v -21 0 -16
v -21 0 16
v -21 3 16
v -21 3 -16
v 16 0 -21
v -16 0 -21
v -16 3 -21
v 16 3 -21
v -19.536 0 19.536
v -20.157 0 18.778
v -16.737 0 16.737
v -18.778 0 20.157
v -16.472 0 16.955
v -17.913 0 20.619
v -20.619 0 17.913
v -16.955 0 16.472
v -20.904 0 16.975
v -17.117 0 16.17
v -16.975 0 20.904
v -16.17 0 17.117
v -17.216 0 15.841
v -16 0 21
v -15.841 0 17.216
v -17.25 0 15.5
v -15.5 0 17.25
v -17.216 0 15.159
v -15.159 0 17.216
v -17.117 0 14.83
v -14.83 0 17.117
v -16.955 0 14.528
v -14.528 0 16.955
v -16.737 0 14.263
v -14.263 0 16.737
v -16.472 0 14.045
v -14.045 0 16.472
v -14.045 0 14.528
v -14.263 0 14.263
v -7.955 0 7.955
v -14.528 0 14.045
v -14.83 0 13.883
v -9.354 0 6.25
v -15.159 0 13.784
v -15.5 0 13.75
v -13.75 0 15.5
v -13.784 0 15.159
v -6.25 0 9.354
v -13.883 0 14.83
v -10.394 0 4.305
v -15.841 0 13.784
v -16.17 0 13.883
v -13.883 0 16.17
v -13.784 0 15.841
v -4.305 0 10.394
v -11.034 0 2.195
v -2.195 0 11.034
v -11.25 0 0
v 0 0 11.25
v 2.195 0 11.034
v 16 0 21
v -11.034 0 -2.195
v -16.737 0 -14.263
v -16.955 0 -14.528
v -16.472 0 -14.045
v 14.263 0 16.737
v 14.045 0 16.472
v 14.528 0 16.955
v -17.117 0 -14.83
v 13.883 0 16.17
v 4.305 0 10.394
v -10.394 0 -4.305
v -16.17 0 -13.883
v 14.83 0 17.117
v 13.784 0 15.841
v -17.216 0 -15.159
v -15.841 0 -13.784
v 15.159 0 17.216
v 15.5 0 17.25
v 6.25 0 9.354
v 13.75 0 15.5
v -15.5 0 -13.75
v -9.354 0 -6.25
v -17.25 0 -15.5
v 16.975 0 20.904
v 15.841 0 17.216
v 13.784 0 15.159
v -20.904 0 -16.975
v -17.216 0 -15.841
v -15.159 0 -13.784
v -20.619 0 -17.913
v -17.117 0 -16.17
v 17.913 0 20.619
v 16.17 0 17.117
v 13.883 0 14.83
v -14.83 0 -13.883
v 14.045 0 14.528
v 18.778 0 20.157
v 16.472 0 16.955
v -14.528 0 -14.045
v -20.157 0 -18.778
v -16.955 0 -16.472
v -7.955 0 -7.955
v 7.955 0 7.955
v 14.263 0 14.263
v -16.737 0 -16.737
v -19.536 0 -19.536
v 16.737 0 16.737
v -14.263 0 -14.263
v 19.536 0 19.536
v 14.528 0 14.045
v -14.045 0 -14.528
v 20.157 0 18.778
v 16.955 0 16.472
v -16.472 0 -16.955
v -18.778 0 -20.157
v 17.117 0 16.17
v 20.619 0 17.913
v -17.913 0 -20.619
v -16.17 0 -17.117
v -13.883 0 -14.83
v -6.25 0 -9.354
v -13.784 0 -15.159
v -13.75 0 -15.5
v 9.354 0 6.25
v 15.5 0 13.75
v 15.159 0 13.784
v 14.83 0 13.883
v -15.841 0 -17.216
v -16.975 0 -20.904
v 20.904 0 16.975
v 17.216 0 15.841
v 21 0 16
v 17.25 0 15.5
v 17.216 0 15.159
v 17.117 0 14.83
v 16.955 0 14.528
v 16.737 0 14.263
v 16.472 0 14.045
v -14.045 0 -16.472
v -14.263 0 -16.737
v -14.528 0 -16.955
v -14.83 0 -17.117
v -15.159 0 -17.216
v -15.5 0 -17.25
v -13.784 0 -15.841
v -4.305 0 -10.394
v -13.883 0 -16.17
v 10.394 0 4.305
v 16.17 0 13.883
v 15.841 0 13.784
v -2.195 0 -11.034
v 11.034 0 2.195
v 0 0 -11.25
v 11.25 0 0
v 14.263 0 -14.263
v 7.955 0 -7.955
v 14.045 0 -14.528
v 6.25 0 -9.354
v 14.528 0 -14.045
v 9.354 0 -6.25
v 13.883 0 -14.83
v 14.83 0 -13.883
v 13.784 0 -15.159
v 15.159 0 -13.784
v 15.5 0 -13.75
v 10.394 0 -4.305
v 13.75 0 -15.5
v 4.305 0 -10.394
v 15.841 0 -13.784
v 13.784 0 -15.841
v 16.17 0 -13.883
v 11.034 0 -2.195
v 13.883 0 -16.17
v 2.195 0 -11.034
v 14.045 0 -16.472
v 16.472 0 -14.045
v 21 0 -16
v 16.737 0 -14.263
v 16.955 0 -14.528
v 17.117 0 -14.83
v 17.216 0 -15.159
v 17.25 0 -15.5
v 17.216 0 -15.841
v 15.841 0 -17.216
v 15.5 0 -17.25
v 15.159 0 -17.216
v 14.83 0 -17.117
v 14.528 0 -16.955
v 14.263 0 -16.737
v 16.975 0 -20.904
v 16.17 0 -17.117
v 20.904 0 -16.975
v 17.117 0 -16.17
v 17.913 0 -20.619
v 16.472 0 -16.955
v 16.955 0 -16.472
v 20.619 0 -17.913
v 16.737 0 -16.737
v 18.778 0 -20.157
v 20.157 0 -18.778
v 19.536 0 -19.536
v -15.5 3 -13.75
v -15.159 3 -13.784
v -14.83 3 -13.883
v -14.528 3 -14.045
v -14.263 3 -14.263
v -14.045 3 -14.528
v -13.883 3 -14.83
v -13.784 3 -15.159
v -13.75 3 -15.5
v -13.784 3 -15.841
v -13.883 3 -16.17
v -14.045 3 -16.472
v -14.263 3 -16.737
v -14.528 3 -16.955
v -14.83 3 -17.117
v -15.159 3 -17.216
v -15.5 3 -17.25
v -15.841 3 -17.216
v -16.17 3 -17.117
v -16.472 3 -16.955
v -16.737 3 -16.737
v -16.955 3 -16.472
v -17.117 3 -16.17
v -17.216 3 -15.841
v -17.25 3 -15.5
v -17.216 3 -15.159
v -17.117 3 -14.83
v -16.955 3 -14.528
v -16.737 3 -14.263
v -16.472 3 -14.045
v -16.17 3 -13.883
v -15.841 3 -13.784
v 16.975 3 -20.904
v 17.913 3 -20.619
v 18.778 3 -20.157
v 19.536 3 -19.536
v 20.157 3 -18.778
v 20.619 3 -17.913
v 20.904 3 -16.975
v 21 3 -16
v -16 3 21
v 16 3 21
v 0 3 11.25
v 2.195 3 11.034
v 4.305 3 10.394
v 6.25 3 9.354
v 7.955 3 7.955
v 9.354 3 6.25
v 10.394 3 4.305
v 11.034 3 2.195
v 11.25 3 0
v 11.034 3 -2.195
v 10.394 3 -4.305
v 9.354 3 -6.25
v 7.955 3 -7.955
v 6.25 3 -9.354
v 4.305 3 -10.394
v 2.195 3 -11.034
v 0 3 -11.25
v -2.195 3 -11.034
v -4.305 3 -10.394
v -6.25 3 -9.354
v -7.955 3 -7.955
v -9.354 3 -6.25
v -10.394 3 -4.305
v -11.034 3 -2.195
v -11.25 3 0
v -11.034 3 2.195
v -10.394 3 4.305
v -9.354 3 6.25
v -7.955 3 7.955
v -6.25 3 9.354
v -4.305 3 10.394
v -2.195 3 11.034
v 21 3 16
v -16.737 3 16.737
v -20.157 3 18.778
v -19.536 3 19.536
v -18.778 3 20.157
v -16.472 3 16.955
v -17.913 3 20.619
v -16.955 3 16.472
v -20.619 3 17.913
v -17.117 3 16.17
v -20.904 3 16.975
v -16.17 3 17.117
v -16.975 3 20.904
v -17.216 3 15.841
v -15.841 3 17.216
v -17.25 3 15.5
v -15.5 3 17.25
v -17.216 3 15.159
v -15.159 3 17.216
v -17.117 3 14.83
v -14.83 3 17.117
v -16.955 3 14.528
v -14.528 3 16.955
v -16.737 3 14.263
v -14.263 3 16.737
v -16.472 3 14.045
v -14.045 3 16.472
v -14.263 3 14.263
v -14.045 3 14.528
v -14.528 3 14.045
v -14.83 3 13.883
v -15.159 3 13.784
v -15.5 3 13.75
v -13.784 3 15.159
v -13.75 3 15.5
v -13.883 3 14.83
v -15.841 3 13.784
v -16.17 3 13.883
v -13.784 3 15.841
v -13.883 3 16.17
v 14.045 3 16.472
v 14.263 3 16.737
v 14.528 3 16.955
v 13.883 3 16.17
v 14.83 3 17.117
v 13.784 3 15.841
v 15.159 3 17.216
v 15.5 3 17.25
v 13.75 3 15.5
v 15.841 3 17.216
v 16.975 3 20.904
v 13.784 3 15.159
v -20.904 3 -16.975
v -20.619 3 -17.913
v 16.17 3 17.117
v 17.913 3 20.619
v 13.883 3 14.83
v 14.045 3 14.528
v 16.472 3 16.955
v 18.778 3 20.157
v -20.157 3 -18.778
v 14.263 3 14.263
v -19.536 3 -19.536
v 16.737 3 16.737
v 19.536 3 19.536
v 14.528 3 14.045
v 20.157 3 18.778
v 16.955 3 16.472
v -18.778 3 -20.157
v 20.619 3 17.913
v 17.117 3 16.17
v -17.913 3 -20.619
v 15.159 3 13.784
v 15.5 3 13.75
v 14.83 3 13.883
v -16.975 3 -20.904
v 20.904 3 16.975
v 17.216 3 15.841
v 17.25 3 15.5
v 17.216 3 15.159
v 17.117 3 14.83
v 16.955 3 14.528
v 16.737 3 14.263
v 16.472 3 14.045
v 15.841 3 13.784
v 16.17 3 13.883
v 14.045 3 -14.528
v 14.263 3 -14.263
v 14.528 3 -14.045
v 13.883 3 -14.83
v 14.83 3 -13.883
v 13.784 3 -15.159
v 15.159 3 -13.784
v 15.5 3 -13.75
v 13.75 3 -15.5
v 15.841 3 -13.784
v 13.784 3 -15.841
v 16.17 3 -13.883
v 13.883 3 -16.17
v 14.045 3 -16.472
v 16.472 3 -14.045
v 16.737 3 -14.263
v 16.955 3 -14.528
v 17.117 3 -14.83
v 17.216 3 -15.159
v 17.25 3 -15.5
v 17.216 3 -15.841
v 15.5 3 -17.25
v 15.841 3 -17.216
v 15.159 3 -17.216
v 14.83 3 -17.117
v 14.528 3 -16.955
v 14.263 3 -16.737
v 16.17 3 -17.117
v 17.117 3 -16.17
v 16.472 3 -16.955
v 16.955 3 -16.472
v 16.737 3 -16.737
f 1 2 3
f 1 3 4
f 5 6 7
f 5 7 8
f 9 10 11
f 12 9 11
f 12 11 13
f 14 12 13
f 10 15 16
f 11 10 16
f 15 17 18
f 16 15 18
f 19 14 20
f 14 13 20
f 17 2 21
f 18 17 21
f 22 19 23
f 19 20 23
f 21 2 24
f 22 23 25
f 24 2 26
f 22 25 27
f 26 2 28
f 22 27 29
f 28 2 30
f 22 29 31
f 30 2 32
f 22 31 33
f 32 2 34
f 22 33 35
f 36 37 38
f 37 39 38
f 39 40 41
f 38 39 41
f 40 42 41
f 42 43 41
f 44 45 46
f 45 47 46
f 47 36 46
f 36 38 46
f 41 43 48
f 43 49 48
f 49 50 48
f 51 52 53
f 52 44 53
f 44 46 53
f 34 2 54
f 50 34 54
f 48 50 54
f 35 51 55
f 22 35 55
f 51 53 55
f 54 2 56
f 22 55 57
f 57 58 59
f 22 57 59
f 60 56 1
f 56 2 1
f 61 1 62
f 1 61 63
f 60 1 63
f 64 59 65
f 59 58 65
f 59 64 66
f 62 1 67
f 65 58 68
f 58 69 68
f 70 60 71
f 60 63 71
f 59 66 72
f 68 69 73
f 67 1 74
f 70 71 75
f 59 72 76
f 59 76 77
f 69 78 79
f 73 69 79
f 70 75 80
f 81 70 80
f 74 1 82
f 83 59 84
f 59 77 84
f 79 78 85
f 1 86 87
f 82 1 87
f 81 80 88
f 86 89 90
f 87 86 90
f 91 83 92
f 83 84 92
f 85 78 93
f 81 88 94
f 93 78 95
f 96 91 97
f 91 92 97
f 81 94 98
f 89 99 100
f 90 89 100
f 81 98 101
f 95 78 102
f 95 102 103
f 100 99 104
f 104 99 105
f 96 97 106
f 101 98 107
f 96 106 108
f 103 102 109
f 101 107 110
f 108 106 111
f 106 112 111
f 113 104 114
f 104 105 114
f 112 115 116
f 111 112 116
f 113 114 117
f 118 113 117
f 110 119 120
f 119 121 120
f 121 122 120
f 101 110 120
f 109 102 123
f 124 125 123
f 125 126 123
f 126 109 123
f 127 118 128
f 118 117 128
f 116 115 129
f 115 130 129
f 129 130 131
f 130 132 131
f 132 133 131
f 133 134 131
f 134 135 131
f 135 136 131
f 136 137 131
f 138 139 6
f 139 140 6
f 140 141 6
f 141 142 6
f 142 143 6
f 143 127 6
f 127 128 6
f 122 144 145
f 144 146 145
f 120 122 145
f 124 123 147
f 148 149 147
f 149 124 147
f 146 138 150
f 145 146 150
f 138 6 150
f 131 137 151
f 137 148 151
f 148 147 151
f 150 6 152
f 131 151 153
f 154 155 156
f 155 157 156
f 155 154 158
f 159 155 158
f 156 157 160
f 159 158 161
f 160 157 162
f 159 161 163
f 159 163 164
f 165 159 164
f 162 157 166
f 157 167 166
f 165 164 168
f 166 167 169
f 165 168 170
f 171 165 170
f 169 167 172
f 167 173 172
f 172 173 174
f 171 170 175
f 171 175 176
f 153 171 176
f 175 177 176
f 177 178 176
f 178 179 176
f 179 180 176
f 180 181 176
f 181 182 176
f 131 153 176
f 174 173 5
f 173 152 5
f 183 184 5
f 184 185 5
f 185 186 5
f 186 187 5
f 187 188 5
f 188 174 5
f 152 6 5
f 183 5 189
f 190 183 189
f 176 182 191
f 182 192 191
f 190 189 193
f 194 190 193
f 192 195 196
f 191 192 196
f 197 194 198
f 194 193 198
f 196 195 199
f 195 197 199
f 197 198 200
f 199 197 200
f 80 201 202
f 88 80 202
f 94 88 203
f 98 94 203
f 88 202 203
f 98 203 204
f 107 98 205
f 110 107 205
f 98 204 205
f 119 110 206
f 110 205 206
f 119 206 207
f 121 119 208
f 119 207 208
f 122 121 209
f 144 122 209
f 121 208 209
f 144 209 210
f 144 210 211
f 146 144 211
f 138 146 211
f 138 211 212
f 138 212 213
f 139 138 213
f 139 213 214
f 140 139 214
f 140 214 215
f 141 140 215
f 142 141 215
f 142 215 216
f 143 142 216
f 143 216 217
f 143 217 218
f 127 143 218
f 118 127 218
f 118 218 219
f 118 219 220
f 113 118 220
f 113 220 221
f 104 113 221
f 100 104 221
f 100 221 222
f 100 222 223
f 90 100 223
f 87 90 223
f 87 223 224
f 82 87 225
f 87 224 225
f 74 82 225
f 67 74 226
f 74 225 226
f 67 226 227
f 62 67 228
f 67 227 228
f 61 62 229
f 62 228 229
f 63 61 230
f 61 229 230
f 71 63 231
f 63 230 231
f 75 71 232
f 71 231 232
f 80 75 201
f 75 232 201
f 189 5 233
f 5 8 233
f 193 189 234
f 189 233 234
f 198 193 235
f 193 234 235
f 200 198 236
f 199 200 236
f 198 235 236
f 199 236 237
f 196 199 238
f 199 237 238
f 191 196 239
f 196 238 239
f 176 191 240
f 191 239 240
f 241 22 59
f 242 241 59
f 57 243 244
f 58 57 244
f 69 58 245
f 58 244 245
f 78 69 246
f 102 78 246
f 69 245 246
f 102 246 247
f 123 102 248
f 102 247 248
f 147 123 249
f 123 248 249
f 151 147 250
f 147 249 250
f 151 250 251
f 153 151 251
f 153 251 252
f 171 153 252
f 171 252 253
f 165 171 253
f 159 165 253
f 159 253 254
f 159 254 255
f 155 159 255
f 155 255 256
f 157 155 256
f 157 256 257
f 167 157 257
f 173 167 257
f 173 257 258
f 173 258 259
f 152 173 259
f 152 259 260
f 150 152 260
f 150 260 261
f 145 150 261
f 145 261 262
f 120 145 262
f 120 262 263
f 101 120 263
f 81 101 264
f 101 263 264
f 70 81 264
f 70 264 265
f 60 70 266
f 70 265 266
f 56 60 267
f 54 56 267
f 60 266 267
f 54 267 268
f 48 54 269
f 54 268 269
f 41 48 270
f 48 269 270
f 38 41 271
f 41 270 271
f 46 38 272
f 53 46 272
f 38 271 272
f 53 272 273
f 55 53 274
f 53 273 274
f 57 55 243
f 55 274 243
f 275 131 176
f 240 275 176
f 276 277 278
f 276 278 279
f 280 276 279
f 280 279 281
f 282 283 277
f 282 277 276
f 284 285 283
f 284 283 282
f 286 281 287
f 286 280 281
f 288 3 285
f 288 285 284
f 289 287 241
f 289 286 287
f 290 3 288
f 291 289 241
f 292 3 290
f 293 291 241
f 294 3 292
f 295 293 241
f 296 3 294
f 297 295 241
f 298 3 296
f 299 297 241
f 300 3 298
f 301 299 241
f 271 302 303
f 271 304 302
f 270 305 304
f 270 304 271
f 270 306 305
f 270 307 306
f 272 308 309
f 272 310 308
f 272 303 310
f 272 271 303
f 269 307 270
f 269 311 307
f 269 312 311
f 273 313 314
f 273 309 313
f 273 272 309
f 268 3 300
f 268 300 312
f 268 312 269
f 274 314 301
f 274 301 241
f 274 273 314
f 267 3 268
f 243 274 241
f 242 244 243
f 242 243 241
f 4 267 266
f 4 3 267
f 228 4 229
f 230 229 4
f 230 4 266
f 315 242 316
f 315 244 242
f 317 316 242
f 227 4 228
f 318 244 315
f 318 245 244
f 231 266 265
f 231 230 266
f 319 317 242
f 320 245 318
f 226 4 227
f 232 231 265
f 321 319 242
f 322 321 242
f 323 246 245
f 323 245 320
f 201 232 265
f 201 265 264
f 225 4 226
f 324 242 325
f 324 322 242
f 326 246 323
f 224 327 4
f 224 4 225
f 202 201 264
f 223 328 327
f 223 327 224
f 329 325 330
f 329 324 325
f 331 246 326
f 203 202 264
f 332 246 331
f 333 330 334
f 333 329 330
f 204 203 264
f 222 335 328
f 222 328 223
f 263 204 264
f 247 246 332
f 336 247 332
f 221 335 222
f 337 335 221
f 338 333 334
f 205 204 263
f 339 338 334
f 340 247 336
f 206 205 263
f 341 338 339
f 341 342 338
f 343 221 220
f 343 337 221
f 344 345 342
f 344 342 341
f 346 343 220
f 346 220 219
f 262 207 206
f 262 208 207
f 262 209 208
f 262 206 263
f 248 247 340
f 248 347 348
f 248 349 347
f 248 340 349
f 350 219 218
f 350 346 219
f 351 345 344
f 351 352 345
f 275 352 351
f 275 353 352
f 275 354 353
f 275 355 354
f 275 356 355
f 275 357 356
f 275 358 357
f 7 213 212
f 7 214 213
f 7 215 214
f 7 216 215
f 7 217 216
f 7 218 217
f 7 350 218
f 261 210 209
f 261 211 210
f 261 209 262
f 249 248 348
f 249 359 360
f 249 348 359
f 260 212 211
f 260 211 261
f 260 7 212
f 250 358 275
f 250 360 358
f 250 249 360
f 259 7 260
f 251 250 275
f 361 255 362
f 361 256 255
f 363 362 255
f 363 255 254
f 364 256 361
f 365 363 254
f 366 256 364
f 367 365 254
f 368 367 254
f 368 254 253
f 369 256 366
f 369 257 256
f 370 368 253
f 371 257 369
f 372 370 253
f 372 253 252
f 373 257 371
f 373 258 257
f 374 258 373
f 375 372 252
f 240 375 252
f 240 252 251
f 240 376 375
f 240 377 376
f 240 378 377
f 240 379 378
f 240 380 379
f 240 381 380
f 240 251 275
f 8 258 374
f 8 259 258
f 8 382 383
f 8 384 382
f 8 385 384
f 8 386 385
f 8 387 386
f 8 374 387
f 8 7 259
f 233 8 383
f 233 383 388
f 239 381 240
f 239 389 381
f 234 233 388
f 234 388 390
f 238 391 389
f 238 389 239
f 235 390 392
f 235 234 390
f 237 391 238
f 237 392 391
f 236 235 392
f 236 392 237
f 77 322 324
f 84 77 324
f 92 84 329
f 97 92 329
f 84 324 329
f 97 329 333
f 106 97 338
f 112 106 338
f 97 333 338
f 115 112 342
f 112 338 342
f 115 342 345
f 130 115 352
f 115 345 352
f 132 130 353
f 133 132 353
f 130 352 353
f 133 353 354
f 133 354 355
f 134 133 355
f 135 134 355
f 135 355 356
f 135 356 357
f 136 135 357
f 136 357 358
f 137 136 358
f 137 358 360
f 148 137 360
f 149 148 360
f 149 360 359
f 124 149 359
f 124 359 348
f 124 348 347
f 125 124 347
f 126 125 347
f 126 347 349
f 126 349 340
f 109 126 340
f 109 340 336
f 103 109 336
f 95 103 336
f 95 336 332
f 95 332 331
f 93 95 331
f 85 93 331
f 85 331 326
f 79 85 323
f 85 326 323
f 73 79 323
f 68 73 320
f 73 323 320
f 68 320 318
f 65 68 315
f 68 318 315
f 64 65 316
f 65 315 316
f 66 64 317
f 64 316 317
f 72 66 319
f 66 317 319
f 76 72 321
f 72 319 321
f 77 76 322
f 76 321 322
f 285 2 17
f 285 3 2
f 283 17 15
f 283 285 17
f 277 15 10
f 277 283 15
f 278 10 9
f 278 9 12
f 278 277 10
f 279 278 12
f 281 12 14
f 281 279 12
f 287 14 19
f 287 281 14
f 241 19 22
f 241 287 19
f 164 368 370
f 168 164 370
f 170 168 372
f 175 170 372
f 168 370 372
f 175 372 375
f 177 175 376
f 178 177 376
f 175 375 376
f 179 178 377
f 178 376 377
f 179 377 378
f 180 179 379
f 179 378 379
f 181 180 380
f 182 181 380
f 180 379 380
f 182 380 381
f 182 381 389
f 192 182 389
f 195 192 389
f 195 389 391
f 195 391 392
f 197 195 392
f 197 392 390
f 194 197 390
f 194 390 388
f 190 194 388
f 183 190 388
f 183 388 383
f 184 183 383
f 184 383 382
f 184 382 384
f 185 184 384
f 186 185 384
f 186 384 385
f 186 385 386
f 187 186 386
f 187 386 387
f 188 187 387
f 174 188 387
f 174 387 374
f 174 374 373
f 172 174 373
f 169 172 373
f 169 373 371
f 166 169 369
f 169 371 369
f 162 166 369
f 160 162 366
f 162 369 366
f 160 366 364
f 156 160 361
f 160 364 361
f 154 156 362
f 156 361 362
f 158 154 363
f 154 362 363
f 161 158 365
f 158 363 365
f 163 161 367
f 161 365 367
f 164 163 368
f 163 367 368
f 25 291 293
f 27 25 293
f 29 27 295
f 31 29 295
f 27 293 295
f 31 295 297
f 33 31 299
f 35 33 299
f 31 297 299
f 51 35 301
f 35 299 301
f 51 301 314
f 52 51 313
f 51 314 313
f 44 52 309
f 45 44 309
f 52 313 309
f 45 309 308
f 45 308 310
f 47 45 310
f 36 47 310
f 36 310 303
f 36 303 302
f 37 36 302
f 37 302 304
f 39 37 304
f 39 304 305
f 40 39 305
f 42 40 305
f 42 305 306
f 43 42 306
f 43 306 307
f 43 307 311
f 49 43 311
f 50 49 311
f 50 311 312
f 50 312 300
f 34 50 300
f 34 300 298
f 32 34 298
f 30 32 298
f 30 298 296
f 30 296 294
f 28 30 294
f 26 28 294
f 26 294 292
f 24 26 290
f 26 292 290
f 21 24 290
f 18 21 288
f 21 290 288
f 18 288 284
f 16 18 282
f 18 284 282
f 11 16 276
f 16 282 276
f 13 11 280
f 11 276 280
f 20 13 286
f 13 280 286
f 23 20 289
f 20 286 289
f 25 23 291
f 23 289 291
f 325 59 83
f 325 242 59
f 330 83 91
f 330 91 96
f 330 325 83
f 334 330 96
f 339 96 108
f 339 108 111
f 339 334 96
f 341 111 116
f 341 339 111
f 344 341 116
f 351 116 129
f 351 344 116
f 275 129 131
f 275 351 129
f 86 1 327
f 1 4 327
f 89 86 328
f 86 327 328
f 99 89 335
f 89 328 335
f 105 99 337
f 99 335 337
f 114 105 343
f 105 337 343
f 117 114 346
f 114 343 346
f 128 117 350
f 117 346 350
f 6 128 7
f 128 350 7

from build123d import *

# Parameters (mm, degrees)
SKETCH1_W           = 42
SKETCH1_H           = 42
BOSS_EXTRUDE1_DEPTH = 3
SKETCH2_R           = 1.75
SKETCH2_R_2         = 11.25
CUT_EXTRUDE1_DEPTH  = 30.849623113
FILLET1_R           = 5


with BuildPart() as part:
    # Sketch1 → Boss-Extrude1 (new body)
    with BuildSketch(Plane(origin=(0, 0, 0), x_dir=(1, 0, 0), z_dir=(0, 1, 0))):
        Rectangle(SKETCH1_W, SKETCH1_H)
    extrude(amount=BOSS_EXTRUDE1_DEPTH)

    # Sketch2 → Cut-Extrude1 (cut, through all)
    with BuildSketch(Plane(origin=(0, 3, 0), x_dir=(1, 0, 0), z_dir=(0, 1, 0))):
        with Locations(Location((-15.5, 15.5, 0), (0, 0, 270))):
            Circle(SKETCH2_R)
        with Locations(Location((15.5, 15.5, 0), (0, 0, 270))):
            Circle(SKETCH2_R)
        with Locations(Location((15.5, -15.5, 0), (0, 0, 270))):
            Circle(SKETCH2_R)
        with Locations(Location((-15.5, -15.5, 0), (0, 0, 270))):
            Circle(SKETCH2_R)
        with Locations(Location((0, 0, 0), (0, 0, 270))):
            Circle(SKETCH2_R_2)
    extrude(amount=-CUT_EXTRUDE1_DEPTH, mode=Mode.SUBTRACT)

    # Fillet1
    fillet1_edges = [part.edges().sort_by_distance(p)[0] for p in [
        (21, 1.5, 21),
        (-21, 1.5, 21),
        (-21, 1.5, -21),
        (21, 1.5, -21),
    ]]
    fillet(fillet1_edges, radius=FILLET1_R)


solid = part.part
